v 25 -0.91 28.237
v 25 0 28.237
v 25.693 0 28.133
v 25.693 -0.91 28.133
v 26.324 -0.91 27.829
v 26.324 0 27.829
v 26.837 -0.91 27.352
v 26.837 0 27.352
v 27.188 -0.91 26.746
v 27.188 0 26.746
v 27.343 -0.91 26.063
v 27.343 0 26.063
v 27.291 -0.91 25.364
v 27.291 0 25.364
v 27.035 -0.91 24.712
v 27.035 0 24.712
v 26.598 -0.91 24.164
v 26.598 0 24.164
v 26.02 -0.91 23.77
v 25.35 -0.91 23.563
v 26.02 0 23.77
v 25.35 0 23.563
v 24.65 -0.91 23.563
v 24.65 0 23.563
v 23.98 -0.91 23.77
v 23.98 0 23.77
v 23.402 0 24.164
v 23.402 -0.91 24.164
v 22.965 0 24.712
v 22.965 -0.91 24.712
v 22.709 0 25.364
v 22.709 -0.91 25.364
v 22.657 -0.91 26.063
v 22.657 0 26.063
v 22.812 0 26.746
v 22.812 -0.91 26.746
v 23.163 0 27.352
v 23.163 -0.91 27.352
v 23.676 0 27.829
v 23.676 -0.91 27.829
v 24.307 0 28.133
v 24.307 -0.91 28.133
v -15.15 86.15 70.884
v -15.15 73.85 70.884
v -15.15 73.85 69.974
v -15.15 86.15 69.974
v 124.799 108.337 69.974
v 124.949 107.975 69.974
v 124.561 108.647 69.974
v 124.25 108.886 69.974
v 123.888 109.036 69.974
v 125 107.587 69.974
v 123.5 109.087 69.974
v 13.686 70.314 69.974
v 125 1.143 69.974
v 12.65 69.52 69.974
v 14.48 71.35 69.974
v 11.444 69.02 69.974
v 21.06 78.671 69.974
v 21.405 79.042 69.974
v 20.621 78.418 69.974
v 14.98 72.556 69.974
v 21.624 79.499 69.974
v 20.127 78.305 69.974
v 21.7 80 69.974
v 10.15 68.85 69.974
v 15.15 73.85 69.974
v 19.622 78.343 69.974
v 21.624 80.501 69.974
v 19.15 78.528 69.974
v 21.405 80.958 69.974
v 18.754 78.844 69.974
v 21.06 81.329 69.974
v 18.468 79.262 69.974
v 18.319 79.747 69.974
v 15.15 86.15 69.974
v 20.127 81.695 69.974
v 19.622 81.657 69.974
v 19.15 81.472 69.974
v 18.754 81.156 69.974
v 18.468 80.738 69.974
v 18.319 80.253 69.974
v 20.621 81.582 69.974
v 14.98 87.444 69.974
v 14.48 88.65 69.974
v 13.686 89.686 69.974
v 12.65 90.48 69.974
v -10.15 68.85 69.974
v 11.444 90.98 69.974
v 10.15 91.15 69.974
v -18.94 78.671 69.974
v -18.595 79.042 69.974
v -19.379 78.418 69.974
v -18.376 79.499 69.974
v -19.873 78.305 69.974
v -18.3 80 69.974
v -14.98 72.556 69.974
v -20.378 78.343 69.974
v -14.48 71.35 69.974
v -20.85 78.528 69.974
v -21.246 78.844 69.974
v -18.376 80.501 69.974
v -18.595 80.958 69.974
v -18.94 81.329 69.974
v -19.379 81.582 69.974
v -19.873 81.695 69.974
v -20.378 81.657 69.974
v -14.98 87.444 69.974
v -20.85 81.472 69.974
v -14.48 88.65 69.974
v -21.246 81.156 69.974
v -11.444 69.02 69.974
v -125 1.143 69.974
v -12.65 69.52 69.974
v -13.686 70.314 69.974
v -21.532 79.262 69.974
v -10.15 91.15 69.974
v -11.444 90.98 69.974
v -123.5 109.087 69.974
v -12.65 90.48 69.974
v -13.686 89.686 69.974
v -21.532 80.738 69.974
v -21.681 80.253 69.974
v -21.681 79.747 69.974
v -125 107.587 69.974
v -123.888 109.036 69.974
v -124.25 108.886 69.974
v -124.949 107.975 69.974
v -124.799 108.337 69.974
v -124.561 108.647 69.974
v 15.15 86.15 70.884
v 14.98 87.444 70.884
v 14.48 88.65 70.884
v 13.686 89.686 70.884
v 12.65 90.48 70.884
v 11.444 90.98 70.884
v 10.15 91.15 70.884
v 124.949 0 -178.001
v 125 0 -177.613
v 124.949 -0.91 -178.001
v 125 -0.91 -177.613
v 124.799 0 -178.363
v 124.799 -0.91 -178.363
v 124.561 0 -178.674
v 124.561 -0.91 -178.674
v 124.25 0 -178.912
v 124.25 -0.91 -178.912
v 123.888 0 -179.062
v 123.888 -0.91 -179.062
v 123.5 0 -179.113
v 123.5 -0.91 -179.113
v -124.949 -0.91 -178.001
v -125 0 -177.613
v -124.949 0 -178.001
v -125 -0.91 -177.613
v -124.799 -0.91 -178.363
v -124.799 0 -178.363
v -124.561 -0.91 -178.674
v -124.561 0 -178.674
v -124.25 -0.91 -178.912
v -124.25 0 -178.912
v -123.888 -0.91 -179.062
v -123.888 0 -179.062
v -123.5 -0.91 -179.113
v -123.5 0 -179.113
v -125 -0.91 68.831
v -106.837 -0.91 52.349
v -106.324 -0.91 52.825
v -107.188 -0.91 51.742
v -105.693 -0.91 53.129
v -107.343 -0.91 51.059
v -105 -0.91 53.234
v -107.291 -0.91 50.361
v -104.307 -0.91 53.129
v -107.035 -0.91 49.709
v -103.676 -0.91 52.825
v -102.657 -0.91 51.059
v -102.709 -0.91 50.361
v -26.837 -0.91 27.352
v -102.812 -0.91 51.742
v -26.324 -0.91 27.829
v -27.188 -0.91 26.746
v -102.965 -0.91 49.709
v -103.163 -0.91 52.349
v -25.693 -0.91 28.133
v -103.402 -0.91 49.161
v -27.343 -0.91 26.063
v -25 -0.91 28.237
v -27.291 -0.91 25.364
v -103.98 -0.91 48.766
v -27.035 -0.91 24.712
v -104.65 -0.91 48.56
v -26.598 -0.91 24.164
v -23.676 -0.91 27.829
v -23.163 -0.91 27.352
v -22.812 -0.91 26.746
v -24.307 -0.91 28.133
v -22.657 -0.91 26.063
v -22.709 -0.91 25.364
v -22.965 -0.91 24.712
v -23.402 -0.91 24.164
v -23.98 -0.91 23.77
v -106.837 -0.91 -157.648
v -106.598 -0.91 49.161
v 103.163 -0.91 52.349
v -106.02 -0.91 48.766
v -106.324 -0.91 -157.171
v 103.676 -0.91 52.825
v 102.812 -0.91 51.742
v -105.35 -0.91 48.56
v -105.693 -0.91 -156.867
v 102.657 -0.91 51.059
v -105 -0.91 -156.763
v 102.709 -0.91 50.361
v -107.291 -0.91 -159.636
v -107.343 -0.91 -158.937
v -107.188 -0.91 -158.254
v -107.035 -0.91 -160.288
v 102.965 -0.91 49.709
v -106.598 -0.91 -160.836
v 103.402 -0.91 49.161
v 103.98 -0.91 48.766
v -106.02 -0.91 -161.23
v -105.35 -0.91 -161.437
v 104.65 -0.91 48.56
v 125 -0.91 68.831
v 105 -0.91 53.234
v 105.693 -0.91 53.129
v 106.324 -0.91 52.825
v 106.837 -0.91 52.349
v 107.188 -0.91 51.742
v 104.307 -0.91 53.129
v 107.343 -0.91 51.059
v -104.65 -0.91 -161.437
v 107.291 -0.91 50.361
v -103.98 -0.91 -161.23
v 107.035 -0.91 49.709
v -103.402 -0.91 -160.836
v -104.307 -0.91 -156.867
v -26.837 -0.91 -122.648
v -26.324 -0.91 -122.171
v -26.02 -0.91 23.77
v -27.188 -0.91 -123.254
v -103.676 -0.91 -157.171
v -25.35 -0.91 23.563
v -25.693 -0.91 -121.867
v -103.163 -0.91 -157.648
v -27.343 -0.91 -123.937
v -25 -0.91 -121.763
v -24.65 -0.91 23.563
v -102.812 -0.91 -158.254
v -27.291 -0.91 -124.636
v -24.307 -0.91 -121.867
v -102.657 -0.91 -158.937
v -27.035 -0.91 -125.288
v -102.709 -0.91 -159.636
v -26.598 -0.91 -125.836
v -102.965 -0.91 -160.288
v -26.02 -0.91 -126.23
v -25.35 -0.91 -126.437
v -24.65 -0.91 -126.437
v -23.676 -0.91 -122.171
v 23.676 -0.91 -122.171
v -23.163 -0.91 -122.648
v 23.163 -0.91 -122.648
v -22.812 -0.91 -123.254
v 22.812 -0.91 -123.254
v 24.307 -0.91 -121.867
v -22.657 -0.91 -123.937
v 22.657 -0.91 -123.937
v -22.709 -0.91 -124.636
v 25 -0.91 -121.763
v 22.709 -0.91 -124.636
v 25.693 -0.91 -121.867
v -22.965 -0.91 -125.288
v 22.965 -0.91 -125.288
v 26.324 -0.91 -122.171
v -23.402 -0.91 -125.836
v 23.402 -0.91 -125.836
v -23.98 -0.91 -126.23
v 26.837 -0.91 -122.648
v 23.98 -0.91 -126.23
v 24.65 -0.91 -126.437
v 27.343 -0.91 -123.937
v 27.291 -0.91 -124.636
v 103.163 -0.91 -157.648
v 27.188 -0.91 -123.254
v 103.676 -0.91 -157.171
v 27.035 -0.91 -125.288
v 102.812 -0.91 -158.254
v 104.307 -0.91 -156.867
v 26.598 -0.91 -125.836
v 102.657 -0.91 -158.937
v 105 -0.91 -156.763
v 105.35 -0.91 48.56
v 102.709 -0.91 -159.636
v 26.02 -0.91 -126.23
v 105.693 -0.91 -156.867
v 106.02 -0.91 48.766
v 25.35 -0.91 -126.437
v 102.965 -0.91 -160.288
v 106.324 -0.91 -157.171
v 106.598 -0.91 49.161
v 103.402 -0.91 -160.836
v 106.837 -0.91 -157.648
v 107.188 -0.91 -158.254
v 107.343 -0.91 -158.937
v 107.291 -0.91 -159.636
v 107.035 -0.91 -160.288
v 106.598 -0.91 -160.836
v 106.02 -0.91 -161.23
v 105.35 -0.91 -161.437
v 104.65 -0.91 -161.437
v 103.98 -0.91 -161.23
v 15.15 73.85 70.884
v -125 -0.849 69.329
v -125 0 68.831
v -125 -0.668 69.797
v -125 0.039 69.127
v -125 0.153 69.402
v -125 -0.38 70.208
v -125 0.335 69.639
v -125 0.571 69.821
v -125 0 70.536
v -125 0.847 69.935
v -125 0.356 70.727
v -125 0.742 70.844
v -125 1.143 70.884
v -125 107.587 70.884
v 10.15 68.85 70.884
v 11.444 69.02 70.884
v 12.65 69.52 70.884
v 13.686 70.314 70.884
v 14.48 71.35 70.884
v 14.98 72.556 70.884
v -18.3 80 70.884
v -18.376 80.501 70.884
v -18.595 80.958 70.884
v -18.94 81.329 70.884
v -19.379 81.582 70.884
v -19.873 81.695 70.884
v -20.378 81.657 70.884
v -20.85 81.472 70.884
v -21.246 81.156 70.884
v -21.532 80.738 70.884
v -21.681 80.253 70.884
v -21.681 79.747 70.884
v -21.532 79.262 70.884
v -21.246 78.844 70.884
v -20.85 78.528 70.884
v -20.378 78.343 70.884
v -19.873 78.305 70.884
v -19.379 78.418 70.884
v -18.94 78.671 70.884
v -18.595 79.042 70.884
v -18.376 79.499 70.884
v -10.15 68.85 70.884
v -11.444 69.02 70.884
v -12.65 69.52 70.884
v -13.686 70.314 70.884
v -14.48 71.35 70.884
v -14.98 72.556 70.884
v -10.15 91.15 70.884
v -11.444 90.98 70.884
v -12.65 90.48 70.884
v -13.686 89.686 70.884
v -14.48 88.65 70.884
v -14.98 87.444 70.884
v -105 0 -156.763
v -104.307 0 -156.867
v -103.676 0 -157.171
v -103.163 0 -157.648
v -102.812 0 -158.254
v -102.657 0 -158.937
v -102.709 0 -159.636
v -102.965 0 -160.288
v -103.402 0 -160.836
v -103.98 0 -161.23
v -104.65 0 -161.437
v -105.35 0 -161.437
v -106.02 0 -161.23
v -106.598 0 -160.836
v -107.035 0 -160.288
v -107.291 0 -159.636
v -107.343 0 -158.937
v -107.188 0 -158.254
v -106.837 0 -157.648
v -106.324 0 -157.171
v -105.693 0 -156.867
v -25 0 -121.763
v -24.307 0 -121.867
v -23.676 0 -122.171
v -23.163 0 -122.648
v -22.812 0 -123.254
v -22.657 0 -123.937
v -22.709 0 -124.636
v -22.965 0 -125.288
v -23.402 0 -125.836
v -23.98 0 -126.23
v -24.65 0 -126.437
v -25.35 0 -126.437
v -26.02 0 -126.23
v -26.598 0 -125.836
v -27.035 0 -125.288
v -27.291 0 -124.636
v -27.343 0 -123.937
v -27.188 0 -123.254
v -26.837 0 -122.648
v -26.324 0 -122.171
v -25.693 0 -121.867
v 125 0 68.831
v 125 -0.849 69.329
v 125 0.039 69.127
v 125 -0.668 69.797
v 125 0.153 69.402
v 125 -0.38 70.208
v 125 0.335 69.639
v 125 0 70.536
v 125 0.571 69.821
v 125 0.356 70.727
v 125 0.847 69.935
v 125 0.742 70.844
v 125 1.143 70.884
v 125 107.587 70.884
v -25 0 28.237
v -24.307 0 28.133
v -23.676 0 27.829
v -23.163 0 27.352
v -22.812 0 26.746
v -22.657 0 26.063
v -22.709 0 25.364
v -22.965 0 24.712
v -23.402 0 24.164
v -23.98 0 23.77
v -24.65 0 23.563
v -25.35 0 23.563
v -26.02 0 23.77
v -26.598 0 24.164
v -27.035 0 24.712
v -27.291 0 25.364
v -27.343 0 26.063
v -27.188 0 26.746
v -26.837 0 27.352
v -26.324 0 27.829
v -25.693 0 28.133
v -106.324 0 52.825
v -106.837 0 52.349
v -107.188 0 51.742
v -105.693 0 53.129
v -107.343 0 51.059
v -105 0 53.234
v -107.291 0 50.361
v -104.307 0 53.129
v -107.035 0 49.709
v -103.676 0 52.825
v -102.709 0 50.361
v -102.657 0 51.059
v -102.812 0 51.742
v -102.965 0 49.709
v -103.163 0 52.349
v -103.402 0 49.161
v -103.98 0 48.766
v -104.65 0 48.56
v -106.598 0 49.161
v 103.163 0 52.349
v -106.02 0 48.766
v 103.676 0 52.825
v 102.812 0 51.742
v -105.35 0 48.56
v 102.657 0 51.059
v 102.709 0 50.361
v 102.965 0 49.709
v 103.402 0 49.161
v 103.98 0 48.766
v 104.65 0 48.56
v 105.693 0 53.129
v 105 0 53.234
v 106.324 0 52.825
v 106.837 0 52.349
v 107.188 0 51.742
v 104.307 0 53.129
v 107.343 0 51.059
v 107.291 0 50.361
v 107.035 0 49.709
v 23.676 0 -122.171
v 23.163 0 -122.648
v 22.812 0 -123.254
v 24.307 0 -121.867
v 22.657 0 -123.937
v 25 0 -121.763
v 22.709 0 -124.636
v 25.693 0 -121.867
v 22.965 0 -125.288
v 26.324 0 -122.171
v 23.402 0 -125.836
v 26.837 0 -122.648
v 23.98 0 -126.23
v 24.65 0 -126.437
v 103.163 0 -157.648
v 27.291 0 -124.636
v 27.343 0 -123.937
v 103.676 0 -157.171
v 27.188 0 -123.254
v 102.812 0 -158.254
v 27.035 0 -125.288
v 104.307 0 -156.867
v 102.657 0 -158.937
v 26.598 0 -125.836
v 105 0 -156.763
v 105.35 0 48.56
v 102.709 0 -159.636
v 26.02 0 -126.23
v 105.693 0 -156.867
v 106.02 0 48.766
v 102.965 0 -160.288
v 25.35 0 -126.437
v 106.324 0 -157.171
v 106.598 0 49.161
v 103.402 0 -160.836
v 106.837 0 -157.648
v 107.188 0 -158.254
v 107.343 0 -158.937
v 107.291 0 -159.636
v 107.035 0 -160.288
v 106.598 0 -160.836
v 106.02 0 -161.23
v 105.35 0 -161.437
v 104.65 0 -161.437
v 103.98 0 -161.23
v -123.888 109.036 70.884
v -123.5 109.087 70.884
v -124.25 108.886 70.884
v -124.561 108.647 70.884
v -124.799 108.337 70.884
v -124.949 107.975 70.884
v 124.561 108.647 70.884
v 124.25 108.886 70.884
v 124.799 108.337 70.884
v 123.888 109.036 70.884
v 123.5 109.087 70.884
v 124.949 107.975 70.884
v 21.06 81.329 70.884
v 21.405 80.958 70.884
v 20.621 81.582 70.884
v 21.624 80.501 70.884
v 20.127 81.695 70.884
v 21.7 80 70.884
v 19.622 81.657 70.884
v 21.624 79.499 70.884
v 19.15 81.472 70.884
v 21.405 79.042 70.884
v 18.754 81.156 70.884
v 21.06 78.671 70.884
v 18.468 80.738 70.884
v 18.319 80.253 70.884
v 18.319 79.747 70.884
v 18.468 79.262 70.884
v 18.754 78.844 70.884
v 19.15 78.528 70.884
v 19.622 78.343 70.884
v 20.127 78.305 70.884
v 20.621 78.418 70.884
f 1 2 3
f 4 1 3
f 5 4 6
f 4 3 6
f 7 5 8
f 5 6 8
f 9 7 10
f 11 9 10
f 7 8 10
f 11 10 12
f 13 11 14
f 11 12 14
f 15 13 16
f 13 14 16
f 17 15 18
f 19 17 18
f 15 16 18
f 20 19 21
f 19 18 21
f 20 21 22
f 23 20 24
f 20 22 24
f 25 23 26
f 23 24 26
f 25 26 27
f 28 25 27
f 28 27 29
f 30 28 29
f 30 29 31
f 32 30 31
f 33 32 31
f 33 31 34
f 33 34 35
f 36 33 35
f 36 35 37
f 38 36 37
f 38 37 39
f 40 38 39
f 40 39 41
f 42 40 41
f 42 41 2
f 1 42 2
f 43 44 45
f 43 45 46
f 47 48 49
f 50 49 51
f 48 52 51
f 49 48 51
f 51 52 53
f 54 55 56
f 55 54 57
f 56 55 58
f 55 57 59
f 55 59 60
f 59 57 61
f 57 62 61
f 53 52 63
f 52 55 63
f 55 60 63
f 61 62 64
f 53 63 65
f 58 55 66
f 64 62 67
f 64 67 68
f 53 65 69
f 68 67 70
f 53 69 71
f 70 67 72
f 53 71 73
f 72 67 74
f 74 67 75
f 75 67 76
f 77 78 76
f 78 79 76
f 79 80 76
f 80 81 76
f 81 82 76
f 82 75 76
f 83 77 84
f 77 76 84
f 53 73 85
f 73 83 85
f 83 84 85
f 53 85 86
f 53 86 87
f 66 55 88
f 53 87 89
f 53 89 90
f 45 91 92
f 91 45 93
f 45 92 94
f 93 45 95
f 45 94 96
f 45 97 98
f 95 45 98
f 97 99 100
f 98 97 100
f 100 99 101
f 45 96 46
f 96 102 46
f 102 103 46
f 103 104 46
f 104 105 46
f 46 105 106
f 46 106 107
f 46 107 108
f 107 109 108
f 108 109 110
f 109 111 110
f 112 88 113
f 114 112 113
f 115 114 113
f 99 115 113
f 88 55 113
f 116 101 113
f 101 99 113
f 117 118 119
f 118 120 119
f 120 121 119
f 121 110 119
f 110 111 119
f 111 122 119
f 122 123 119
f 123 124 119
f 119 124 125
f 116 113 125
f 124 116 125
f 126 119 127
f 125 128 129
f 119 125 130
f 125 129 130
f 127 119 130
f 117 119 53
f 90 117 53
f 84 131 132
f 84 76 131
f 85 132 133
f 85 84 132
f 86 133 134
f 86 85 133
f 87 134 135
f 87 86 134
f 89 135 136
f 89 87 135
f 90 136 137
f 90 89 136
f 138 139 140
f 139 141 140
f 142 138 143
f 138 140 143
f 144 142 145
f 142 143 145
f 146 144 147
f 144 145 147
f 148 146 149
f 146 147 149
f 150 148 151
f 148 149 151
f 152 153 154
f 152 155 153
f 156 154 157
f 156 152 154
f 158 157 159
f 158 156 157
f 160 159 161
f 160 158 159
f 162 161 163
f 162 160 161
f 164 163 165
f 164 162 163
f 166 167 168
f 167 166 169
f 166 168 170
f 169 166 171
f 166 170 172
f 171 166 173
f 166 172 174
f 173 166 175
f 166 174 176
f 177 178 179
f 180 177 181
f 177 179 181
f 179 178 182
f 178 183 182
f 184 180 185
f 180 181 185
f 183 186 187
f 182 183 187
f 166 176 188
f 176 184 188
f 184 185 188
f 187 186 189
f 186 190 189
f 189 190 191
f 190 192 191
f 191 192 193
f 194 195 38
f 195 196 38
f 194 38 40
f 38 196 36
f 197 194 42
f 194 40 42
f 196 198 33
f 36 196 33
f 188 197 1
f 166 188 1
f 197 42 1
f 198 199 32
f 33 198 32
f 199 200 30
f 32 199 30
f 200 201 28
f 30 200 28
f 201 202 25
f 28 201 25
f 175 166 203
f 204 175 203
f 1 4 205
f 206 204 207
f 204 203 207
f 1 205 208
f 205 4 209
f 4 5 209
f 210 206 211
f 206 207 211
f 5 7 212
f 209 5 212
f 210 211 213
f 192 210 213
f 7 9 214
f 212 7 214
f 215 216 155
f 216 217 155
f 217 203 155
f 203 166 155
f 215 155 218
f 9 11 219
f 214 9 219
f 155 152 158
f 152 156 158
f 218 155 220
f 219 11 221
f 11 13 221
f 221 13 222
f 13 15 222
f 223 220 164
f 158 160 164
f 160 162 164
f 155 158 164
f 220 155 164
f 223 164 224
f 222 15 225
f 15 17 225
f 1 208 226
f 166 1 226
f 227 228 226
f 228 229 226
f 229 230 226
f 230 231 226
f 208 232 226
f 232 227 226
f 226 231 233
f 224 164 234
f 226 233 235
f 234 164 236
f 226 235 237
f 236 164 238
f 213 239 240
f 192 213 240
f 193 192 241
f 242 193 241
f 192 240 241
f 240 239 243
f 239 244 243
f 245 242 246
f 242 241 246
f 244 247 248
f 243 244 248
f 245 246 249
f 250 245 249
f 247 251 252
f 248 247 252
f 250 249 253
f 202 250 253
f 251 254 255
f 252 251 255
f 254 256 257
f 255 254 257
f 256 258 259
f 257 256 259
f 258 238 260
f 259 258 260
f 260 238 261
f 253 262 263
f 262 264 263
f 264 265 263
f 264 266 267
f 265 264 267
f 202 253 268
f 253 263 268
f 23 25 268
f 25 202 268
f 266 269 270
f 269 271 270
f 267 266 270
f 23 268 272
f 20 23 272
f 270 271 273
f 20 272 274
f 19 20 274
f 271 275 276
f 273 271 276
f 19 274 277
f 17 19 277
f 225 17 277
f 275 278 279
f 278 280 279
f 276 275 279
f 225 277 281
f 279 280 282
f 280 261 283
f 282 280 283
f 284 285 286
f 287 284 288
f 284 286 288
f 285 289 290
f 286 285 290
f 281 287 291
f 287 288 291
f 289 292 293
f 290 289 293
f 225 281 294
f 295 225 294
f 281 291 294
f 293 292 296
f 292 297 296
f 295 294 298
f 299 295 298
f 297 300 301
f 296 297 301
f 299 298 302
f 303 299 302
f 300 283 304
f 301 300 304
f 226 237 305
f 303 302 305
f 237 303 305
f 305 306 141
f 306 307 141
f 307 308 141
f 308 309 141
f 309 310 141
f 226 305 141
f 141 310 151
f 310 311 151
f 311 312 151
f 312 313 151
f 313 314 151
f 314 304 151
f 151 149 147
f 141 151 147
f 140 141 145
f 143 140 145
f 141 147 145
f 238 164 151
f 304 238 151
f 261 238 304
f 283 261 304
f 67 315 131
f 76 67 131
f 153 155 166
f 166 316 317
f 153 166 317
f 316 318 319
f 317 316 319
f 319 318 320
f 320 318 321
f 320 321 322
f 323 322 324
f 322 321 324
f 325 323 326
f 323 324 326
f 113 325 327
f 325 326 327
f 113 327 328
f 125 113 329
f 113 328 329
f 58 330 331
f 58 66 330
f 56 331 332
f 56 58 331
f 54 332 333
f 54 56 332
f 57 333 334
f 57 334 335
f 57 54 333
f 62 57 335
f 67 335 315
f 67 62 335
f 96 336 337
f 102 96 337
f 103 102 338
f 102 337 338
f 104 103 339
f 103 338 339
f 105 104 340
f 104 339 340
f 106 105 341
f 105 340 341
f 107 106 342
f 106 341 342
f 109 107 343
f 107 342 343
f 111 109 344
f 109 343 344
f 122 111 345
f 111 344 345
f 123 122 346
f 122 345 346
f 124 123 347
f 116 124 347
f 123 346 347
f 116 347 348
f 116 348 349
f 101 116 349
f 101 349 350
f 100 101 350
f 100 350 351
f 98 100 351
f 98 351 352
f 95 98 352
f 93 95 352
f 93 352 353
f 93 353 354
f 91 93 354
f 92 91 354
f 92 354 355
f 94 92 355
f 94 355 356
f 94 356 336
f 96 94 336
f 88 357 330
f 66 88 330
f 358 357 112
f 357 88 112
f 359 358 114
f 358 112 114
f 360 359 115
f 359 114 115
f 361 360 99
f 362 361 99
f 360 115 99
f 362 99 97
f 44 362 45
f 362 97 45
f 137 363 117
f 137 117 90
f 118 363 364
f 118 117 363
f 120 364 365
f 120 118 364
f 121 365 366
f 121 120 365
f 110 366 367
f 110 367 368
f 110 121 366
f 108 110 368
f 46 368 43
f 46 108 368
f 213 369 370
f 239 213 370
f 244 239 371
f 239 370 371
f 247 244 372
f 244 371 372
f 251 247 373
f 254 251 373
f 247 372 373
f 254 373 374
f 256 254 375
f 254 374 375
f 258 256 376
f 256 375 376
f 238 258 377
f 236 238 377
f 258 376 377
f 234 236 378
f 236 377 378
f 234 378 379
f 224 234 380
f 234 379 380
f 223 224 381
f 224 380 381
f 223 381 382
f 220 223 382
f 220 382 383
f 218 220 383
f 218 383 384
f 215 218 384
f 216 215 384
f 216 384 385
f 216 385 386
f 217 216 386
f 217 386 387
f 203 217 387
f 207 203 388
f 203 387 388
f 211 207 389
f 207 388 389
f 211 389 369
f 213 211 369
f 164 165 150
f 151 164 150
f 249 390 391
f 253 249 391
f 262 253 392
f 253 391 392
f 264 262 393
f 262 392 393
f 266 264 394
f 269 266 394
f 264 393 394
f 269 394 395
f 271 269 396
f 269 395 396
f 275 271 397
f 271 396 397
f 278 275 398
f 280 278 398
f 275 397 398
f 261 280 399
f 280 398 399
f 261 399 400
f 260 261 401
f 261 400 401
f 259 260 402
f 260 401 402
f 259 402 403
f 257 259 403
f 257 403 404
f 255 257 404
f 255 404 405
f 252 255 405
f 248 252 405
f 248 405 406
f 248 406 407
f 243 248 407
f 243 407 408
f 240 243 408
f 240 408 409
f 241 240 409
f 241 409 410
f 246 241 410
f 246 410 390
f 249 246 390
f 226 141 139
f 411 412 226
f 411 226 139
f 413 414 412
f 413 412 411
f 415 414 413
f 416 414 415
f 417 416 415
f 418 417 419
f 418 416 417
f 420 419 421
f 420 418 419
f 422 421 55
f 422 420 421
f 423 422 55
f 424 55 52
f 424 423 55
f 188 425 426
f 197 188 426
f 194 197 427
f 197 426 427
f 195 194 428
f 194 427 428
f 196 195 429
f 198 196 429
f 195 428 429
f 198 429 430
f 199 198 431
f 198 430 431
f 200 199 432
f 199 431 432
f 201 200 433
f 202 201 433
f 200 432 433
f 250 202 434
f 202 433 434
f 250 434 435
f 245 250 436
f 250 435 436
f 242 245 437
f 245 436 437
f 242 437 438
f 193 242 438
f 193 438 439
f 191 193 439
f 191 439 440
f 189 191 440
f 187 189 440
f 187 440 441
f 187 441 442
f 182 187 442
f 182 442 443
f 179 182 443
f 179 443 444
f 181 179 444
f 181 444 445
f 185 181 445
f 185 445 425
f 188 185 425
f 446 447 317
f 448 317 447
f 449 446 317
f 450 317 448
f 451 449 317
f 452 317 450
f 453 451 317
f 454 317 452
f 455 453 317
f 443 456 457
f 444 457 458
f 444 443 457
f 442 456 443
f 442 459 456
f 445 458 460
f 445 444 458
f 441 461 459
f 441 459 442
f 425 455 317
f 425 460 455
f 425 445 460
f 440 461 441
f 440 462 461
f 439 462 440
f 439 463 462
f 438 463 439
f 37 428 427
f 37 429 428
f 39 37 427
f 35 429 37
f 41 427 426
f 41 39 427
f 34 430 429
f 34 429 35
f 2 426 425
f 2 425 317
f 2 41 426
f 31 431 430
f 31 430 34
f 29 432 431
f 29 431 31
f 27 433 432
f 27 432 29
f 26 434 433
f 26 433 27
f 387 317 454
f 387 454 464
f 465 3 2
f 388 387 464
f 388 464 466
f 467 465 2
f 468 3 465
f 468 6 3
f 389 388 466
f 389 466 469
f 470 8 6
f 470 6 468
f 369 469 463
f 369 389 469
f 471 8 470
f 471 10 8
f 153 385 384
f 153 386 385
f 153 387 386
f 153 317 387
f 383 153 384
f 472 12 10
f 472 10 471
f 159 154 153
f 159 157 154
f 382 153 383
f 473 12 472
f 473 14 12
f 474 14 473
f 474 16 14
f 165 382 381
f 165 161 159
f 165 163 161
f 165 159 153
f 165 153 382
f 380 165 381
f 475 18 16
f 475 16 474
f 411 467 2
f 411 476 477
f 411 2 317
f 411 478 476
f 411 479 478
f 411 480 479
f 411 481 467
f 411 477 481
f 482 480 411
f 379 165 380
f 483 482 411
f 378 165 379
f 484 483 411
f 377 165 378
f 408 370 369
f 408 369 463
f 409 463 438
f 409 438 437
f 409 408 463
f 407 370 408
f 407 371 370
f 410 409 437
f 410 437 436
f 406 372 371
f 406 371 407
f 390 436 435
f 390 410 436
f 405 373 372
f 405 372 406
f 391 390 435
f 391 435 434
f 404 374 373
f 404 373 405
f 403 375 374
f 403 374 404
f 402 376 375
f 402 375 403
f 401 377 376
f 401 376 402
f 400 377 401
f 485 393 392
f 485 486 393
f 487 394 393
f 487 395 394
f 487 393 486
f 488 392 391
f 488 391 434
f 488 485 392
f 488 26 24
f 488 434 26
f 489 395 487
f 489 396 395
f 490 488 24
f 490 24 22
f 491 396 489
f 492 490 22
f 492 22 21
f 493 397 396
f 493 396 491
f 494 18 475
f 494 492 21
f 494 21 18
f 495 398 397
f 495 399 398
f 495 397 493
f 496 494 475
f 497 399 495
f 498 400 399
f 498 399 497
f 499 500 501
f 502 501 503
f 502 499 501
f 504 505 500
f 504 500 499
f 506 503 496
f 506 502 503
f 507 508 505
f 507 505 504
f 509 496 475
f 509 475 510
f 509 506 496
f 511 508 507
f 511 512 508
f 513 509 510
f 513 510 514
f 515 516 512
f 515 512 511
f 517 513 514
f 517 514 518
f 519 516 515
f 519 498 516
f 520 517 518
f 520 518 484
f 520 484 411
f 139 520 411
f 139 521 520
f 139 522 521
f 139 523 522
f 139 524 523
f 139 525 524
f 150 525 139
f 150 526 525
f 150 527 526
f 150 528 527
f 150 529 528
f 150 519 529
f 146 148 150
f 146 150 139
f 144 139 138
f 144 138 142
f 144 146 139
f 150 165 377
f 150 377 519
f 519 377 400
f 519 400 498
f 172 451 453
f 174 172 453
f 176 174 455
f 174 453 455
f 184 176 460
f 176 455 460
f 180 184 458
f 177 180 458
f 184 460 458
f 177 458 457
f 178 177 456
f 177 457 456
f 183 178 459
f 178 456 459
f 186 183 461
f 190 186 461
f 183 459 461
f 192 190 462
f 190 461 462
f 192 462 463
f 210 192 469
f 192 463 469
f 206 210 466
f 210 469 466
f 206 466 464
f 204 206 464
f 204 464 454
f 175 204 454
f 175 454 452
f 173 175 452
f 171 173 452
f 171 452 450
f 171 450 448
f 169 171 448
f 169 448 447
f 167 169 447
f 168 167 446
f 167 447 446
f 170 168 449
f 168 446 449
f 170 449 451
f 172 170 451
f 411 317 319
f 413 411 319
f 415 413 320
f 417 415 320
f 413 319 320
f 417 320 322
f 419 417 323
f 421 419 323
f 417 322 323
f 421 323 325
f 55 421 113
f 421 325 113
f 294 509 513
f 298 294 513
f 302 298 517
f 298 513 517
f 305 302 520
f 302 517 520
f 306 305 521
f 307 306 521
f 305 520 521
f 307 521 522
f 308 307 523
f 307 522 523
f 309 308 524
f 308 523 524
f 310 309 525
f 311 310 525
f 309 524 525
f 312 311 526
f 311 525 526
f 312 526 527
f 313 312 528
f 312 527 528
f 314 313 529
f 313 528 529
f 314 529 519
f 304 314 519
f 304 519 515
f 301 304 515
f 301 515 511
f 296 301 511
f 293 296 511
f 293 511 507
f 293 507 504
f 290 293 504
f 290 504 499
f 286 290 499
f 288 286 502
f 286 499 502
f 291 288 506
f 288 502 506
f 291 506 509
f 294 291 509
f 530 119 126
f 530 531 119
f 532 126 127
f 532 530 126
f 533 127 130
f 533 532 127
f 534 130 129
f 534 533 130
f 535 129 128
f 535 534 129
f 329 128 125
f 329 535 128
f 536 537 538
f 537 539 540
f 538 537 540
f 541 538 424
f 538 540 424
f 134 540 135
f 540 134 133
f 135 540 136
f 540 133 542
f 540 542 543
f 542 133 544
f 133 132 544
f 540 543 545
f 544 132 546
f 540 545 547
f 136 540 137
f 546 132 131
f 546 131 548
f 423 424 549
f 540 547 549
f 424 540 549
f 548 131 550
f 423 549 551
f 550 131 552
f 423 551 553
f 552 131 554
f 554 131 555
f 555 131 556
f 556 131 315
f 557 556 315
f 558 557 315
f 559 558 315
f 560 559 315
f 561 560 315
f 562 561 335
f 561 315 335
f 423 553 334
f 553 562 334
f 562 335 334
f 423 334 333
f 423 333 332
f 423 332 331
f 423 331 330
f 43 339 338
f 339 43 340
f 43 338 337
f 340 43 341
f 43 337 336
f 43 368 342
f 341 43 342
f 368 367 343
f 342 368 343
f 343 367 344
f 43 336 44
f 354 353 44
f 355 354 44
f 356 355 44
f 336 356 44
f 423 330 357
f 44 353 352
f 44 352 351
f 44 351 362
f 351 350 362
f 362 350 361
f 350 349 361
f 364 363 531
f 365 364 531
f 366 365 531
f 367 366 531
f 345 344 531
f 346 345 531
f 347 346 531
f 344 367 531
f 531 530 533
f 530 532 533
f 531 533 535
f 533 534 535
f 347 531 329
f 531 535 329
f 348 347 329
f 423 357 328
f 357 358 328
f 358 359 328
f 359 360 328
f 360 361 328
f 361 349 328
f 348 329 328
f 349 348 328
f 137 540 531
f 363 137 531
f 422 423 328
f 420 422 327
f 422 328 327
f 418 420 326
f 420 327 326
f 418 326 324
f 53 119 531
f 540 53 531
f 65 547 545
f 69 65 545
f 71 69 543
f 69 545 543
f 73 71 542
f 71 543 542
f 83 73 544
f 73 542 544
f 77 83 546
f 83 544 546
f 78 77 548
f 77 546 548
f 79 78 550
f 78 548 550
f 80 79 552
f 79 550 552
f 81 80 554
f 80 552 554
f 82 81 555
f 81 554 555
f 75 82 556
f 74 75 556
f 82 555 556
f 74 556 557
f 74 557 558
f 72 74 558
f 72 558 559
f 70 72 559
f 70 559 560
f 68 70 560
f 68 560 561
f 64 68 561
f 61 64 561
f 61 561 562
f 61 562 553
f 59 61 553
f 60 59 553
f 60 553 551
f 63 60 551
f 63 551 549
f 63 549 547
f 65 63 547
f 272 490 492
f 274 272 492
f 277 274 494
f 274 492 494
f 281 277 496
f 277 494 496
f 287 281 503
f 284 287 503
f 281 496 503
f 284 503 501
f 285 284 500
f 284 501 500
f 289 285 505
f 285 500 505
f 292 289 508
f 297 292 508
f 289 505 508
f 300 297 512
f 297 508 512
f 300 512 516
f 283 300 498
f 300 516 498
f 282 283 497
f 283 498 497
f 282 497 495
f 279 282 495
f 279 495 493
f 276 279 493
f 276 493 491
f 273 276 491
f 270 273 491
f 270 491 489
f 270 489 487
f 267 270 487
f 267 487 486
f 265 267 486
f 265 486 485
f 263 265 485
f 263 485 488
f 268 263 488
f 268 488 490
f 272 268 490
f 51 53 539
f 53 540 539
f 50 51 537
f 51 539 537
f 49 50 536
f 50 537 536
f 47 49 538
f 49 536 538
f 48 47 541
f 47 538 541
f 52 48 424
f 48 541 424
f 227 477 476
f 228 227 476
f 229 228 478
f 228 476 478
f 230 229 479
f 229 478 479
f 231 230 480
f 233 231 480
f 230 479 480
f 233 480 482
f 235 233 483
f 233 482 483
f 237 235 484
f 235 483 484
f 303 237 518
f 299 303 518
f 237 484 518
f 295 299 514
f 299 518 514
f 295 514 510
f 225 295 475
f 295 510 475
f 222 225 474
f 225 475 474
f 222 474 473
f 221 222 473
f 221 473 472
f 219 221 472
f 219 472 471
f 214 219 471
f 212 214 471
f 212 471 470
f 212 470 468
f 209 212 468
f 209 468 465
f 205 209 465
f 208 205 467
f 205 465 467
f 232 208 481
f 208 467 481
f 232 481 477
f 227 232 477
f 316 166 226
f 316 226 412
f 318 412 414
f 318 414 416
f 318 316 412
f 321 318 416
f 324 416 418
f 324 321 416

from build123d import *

# Parameters (mm, degrees)
SKETCH1_W              = 250
SKETCH1_H              = 358.226
BASE_FLANGE1_DEPTH     = 0.91
SKETCHED_START         = -125
SKETCHED_BEND1_DEPTH   = 250
SKETCHED_BEND1_2_DEPTH = 250
SKETCH10_R             = 2.35
CUT_EXTRUDE1_DEPTH     = 0.91
FILLET1_R              = 1.5
SKETCH11_R             = 2.35
CUT_EXTRUDE2_DEPTH     = 10
SKETCH12_R             = 1.7
SKETCH12_W             = 30.3
SKETCH12_H             = 22.3
CUT_EXTRUDE3_DEPTH     = 10
FILLET2_R              = 5


# Read off the part's stored shape, not the designer's step: Sketched Bend1
# Sheet-metal steps are written as plain solids
with BuildPart() as part:
    # Sketch1 → Base-Flange1 (new body)
    with BuildSketch(Plane(origin=(0, 0, 0), x_dir=(1, 0, 0), z_dir=(0, 1, 0))):
        Rectangle(SKETCH1_W, SKETCH1_H)
    extrude(amount=-BASE_FLANGE1_DEPTH)

    # Sketched Bend1 outline → Sketched Bend1 (cut)
    with BuildSketch(Plane.YZ.offset(SKETCHED_START)):
        with BuildLine():
            ThreePointArc((-0.91, 68.830699214), (-0.668268616, 69.797195464), (0, 70.536090665))
            Line((0, 70.536090665), (0, 179.113))
            Line((0, 179.113), (-0.91, 179.113))
            Line((-0.91, 179.113), (-0.91, 68.830699214))
        make_face()
    extrude(amount=SKETCHED_BEND1_DEPTH, mode=Mode.SUBTRACT)

    # Sketched Bend1 2 outline → Sketched Bend1 2 (add)
    with BuildSketch(Plane.YZ.offset(SKETCHED_START)):
        with BuildLine():
            Line((109.086699214, 69.973699214), (109.086699214, 70.883699214))
            Line((109.086699214, 70.883699214), (1.143, 70.883699214))
            ThreePointArc((1.143, 70.883699214), (0.545655731, 70.794875587), (0, 70.536090665))
            Line((0, 70.536090665), (0, 68.830699214))
            ThreePointArc((0, 68.830699214), (0.334776949, 69.638922265), (1.143, 69.973699214))
            Line((1.143, 69.973699214), (109.086699214, 69.973699214))
        make_face()
    extrude(amount=SKETCHED_BEND1_2_DEPTH)

    # Sketch10 → Cut-Extrude1 (cut)
    with BuildSketch(Plane(origin=(0, 0, 0), x_dir=(1, 0, 0), z_dir=(0, 1, 0))):
        with Locations(Location((-105, 159.113, 0), (0, 0, 270))):
            Circle(SKETCH10_R)
        with Locations(Location((105, 159.113, 0), (0, 0, 270))):
            Circle(SKETCH10_R)
        with Locations(Location((105, -50.883699214, 0), (0, 0, 270))):
            Circle(SKETCH10_R)
        with Locations(Location((-105, -50.883699214, 0), (0, 0, 270))):
            Circle(SKETCH10_R)
    extrude(amount=-CUT_EXTRUDE1_DEPTH, mode=Mode.SUBTRACT)

    # Fillet1
    fillet1_edges = [part.edges().sort_by_distance(p)[0] for p in [
        (-125, -0.455, -179.113),
        (125, -0.455, -179.113),
        (125, 109.086699214, 70.428699214),
        (-125, 109.086699214, 70.428699214),
    ]]
    fillet(fillet1_edges, radius=FILLET1_R)

    # Sketch11 → Cut-Extrude2 (cut)
    with BuildSketch(Plane(origin=(0, 0, 0), x_dir=(1, 0, 0), z_dir=(0, 1, 0))):
        with Locations(Location((25, 124.113, 0), (0, 0, 270))):
            Circle(SKETCH11_R)
        with Locations(Location((-25, 124.113, 0), (0, 0, 270))):
            Circle(SKETCH11_R)
        with Locations(Location((-25, -25.887, 0), (0, 0, 270))):
            Circle(SKETCH11_R)
        with Locations(Location((25, -25.887, 0), (0, 0, 270))):
            Circle(SKETCH11_R)
    extrude(amount=-CUT_EXTRUDE2_DEPTH, mode=Mode.SUBTRACT)

    # Sketch12 → Cut-Extrude3 (cut)
    with BuildSketch(Plane.XY.offset(70.883699214)):
        with Locations((-20, 80)):
            Circle(SKETCH12_R)
        with Locations((20, 80)):
            Circle(SKETCH12_R)
        with Locations((0, 80)):
            Rectangle(SKETCH12_W, SKETCH12_H)
    extrude(amount=-CUT_EXTRUDE3_DEPTH, mode=Mode.SUBTRACT)

    # Fillet2
    fillet2_edges = [part.edges().sort_by_distance(p)[0] for p in [
        (15.15, 91.15, 70.428699214),
        (15.15, 68.85, 70.428699214),
        (-15.15, 68.85, 70.428699214),
        (-15.15, 91.15, 70.428699214),
    ]]
    fillet(fillet2_edges, radius=FILLET2_R)


solid = part.part
